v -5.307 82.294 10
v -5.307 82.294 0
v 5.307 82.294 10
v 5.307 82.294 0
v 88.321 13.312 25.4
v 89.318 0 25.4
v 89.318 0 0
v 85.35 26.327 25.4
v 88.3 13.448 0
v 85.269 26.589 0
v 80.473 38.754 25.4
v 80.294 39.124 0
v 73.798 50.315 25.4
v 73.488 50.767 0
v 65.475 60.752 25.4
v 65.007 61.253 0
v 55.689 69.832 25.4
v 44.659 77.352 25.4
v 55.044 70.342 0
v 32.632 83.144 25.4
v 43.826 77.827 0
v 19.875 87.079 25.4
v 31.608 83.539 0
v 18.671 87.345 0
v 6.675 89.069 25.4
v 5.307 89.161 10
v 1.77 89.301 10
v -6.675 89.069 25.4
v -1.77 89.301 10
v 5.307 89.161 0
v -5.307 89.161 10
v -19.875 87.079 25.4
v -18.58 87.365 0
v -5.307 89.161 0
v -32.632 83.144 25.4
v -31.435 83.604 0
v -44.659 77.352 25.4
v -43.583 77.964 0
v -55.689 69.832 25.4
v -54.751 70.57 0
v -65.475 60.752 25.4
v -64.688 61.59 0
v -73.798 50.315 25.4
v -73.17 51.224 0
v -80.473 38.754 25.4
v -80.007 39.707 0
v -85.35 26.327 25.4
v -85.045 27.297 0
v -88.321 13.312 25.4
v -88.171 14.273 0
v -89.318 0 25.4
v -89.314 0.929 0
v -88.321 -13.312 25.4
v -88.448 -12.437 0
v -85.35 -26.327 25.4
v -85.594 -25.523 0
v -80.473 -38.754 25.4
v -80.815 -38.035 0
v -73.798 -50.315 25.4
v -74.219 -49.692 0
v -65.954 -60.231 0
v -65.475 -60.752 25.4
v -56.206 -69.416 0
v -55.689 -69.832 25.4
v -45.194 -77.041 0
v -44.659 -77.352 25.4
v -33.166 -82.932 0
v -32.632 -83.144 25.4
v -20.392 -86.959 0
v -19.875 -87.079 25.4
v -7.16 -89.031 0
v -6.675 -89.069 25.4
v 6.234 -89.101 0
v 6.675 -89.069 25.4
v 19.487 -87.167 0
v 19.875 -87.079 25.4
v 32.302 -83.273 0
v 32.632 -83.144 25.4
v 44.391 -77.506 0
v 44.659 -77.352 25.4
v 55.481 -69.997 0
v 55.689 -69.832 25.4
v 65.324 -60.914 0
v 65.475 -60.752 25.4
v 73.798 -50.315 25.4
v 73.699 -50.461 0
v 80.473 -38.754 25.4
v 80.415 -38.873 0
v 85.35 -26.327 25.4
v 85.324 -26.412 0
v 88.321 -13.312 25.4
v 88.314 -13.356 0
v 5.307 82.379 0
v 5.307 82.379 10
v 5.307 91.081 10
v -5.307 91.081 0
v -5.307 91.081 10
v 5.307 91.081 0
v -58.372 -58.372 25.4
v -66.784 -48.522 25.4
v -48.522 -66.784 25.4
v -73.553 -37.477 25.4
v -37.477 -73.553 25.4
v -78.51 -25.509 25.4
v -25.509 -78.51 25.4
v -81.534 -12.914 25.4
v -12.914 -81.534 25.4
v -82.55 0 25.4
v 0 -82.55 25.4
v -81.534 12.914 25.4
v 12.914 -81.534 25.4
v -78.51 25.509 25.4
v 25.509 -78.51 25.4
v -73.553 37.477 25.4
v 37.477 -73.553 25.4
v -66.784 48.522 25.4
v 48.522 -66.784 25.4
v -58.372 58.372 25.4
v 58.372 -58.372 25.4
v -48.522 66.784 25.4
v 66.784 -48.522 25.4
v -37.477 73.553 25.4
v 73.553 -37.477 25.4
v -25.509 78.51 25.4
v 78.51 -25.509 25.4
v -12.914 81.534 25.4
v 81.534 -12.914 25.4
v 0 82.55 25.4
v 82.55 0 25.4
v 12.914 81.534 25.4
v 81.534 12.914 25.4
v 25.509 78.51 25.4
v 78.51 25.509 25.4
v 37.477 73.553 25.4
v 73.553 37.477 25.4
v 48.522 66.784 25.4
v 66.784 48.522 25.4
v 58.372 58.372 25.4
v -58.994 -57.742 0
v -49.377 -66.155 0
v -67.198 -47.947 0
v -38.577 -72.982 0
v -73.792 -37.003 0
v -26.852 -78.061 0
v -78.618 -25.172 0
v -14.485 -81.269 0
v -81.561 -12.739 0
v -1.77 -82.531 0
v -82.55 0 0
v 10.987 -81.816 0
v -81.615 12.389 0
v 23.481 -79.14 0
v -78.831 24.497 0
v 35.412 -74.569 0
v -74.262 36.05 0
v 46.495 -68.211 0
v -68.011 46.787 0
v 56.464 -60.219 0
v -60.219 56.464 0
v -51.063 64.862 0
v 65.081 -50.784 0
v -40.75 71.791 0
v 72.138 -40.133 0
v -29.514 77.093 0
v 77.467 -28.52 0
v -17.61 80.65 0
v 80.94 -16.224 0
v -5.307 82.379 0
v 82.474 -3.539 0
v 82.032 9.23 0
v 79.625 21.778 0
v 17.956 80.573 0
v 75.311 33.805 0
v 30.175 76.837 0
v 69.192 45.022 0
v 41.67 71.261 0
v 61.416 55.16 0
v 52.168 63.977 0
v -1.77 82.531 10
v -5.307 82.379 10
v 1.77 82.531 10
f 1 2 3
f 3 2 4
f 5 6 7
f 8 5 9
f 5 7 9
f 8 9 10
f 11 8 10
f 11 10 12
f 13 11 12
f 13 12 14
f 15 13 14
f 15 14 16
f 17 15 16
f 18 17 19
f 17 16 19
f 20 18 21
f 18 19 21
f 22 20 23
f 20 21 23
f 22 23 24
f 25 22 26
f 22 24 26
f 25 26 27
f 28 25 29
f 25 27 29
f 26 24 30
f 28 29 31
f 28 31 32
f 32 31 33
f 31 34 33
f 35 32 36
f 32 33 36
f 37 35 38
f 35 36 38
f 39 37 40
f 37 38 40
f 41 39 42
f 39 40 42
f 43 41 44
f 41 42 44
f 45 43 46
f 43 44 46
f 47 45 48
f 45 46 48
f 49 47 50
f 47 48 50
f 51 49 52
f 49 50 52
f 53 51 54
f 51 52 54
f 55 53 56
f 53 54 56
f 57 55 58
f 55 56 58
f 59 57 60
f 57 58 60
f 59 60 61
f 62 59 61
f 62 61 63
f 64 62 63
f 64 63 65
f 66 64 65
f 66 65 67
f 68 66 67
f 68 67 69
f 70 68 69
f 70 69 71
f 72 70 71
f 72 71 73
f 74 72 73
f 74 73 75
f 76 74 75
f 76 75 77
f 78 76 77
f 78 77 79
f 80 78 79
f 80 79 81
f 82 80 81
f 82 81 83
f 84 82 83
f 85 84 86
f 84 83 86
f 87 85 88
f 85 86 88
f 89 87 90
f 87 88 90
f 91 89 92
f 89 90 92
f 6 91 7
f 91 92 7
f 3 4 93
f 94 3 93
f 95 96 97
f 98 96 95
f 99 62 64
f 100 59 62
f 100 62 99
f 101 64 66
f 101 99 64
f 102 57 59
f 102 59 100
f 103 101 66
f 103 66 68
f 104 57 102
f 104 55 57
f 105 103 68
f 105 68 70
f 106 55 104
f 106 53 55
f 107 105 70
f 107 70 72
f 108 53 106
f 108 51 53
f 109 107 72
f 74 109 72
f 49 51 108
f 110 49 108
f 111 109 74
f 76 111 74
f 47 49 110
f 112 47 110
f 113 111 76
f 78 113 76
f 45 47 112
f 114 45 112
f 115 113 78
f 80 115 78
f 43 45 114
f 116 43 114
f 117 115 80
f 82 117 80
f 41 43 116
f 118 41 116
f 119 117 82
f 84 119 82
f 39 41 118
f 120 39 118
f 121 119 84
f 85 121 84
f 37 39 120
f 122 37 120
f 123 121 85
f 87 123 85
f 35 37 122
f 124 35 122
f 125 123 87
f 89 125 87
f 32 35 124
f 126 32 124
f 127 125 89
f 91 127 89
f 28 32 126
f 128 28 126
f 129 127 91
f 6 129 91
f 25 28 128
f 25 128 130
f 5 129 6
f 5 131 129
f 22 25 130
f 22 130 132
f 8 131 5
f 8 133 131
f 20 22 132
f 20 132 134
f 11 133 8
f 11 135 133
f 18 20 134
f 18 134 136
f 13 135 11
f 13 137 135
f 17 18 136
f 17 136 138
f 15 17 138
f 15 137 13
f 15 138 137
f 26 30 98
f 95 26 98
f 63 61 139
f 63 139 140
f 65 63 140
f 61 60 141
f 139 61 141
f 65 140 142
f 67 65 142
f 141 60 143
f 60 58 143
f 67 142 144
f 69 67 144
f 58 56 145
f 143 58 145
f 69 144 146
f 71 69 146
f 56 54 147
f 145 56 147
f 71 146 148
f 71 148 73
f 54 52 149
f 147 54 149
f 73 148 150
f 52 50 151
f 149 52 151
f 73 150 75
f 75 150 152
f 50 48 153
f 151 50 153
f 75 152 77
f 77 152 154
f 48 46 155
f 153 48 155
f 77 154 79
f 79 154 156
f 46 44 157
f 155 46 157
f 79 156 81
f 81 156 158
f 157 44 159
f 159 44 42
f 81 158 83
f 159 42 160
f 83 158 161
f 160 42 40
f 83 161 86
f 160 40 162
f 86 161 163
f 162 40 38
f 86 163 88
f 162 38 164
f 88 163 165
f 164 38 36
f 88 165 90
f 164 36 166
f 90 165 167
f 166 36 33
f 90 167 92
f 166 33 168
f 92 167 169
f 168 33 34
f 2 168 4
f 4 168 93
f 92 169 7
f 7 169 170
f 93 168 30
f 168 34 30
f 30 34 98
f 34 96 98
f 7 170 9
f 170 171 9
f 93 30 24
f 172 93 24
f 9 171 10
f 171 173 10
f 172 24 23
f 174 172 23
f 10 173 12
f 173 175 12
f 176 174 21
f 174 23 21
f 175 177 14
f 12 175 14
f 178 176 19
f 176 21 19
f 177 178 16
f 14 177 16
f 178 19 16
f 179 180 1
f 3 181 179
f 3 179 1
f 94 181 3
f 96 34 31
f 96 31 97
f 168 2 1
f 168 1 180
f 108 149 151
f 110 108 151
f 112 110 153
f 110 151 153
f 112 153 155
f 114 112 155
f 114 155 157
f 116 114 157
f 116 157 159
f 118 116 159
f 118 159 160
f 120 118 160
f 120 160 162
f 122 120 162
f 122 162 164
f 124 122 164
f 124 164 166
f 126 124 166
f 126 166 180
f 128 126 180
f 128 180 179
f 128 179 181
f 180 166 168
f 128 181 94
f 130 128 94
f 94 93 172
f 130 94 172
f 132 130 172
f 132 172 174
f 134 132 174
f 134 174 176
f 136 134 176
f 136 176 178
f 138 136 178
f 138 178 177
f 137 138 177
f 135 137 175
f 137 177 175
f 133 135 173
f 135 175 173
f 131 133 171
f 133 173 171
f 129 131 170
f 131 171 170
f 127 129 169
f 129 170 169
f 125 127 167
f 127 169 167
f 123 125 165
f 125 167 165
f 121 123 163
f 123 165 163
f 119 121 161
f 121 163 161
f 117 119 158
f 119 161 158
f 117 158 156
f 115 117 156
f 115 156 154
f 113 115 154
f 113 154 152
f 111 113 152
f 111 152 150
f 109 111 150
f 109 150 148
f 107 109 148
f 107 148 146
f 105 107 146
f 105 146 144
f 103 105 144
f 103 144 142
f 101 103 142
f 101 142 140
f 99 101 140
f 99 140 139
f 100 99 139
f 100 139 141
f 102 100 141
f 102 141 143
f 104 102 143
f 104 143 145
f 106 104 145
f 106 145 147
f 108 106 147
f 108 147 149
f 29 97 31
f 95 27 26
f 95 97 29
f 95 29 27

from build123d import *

# Parameters (mm, degrees)
F0_R     = 89.31838
F1_DEPTH = 25.4
F3_D     = 165.1
F3_DEPTH = 101.6
F4_W     = 10.614076
F4_H     = 8.786991
F5_DEPTH = 10


with BuildPart() as f1:
    # F0 (on Top) → F1 (new body)
    with BuildSketch(Plane.XY):
        Circle(F0_R)
    extrude(amount=F1_DEPTH)

    # F3
    with Locations(Plane.XY.offset(25.4)):
        with Locations((0, 0)):
            Hole(F3_D / 2, depth=F3_DEPTH)

    # F4 (on Top) → F5 (join)
    with BuildSketch(Plane.XY):
        with Locations((0, 86.68711)):
            Rectangle(F4_W, F4_H)
    extrude(amount=F5_DEPTH)


solid = f1.part
